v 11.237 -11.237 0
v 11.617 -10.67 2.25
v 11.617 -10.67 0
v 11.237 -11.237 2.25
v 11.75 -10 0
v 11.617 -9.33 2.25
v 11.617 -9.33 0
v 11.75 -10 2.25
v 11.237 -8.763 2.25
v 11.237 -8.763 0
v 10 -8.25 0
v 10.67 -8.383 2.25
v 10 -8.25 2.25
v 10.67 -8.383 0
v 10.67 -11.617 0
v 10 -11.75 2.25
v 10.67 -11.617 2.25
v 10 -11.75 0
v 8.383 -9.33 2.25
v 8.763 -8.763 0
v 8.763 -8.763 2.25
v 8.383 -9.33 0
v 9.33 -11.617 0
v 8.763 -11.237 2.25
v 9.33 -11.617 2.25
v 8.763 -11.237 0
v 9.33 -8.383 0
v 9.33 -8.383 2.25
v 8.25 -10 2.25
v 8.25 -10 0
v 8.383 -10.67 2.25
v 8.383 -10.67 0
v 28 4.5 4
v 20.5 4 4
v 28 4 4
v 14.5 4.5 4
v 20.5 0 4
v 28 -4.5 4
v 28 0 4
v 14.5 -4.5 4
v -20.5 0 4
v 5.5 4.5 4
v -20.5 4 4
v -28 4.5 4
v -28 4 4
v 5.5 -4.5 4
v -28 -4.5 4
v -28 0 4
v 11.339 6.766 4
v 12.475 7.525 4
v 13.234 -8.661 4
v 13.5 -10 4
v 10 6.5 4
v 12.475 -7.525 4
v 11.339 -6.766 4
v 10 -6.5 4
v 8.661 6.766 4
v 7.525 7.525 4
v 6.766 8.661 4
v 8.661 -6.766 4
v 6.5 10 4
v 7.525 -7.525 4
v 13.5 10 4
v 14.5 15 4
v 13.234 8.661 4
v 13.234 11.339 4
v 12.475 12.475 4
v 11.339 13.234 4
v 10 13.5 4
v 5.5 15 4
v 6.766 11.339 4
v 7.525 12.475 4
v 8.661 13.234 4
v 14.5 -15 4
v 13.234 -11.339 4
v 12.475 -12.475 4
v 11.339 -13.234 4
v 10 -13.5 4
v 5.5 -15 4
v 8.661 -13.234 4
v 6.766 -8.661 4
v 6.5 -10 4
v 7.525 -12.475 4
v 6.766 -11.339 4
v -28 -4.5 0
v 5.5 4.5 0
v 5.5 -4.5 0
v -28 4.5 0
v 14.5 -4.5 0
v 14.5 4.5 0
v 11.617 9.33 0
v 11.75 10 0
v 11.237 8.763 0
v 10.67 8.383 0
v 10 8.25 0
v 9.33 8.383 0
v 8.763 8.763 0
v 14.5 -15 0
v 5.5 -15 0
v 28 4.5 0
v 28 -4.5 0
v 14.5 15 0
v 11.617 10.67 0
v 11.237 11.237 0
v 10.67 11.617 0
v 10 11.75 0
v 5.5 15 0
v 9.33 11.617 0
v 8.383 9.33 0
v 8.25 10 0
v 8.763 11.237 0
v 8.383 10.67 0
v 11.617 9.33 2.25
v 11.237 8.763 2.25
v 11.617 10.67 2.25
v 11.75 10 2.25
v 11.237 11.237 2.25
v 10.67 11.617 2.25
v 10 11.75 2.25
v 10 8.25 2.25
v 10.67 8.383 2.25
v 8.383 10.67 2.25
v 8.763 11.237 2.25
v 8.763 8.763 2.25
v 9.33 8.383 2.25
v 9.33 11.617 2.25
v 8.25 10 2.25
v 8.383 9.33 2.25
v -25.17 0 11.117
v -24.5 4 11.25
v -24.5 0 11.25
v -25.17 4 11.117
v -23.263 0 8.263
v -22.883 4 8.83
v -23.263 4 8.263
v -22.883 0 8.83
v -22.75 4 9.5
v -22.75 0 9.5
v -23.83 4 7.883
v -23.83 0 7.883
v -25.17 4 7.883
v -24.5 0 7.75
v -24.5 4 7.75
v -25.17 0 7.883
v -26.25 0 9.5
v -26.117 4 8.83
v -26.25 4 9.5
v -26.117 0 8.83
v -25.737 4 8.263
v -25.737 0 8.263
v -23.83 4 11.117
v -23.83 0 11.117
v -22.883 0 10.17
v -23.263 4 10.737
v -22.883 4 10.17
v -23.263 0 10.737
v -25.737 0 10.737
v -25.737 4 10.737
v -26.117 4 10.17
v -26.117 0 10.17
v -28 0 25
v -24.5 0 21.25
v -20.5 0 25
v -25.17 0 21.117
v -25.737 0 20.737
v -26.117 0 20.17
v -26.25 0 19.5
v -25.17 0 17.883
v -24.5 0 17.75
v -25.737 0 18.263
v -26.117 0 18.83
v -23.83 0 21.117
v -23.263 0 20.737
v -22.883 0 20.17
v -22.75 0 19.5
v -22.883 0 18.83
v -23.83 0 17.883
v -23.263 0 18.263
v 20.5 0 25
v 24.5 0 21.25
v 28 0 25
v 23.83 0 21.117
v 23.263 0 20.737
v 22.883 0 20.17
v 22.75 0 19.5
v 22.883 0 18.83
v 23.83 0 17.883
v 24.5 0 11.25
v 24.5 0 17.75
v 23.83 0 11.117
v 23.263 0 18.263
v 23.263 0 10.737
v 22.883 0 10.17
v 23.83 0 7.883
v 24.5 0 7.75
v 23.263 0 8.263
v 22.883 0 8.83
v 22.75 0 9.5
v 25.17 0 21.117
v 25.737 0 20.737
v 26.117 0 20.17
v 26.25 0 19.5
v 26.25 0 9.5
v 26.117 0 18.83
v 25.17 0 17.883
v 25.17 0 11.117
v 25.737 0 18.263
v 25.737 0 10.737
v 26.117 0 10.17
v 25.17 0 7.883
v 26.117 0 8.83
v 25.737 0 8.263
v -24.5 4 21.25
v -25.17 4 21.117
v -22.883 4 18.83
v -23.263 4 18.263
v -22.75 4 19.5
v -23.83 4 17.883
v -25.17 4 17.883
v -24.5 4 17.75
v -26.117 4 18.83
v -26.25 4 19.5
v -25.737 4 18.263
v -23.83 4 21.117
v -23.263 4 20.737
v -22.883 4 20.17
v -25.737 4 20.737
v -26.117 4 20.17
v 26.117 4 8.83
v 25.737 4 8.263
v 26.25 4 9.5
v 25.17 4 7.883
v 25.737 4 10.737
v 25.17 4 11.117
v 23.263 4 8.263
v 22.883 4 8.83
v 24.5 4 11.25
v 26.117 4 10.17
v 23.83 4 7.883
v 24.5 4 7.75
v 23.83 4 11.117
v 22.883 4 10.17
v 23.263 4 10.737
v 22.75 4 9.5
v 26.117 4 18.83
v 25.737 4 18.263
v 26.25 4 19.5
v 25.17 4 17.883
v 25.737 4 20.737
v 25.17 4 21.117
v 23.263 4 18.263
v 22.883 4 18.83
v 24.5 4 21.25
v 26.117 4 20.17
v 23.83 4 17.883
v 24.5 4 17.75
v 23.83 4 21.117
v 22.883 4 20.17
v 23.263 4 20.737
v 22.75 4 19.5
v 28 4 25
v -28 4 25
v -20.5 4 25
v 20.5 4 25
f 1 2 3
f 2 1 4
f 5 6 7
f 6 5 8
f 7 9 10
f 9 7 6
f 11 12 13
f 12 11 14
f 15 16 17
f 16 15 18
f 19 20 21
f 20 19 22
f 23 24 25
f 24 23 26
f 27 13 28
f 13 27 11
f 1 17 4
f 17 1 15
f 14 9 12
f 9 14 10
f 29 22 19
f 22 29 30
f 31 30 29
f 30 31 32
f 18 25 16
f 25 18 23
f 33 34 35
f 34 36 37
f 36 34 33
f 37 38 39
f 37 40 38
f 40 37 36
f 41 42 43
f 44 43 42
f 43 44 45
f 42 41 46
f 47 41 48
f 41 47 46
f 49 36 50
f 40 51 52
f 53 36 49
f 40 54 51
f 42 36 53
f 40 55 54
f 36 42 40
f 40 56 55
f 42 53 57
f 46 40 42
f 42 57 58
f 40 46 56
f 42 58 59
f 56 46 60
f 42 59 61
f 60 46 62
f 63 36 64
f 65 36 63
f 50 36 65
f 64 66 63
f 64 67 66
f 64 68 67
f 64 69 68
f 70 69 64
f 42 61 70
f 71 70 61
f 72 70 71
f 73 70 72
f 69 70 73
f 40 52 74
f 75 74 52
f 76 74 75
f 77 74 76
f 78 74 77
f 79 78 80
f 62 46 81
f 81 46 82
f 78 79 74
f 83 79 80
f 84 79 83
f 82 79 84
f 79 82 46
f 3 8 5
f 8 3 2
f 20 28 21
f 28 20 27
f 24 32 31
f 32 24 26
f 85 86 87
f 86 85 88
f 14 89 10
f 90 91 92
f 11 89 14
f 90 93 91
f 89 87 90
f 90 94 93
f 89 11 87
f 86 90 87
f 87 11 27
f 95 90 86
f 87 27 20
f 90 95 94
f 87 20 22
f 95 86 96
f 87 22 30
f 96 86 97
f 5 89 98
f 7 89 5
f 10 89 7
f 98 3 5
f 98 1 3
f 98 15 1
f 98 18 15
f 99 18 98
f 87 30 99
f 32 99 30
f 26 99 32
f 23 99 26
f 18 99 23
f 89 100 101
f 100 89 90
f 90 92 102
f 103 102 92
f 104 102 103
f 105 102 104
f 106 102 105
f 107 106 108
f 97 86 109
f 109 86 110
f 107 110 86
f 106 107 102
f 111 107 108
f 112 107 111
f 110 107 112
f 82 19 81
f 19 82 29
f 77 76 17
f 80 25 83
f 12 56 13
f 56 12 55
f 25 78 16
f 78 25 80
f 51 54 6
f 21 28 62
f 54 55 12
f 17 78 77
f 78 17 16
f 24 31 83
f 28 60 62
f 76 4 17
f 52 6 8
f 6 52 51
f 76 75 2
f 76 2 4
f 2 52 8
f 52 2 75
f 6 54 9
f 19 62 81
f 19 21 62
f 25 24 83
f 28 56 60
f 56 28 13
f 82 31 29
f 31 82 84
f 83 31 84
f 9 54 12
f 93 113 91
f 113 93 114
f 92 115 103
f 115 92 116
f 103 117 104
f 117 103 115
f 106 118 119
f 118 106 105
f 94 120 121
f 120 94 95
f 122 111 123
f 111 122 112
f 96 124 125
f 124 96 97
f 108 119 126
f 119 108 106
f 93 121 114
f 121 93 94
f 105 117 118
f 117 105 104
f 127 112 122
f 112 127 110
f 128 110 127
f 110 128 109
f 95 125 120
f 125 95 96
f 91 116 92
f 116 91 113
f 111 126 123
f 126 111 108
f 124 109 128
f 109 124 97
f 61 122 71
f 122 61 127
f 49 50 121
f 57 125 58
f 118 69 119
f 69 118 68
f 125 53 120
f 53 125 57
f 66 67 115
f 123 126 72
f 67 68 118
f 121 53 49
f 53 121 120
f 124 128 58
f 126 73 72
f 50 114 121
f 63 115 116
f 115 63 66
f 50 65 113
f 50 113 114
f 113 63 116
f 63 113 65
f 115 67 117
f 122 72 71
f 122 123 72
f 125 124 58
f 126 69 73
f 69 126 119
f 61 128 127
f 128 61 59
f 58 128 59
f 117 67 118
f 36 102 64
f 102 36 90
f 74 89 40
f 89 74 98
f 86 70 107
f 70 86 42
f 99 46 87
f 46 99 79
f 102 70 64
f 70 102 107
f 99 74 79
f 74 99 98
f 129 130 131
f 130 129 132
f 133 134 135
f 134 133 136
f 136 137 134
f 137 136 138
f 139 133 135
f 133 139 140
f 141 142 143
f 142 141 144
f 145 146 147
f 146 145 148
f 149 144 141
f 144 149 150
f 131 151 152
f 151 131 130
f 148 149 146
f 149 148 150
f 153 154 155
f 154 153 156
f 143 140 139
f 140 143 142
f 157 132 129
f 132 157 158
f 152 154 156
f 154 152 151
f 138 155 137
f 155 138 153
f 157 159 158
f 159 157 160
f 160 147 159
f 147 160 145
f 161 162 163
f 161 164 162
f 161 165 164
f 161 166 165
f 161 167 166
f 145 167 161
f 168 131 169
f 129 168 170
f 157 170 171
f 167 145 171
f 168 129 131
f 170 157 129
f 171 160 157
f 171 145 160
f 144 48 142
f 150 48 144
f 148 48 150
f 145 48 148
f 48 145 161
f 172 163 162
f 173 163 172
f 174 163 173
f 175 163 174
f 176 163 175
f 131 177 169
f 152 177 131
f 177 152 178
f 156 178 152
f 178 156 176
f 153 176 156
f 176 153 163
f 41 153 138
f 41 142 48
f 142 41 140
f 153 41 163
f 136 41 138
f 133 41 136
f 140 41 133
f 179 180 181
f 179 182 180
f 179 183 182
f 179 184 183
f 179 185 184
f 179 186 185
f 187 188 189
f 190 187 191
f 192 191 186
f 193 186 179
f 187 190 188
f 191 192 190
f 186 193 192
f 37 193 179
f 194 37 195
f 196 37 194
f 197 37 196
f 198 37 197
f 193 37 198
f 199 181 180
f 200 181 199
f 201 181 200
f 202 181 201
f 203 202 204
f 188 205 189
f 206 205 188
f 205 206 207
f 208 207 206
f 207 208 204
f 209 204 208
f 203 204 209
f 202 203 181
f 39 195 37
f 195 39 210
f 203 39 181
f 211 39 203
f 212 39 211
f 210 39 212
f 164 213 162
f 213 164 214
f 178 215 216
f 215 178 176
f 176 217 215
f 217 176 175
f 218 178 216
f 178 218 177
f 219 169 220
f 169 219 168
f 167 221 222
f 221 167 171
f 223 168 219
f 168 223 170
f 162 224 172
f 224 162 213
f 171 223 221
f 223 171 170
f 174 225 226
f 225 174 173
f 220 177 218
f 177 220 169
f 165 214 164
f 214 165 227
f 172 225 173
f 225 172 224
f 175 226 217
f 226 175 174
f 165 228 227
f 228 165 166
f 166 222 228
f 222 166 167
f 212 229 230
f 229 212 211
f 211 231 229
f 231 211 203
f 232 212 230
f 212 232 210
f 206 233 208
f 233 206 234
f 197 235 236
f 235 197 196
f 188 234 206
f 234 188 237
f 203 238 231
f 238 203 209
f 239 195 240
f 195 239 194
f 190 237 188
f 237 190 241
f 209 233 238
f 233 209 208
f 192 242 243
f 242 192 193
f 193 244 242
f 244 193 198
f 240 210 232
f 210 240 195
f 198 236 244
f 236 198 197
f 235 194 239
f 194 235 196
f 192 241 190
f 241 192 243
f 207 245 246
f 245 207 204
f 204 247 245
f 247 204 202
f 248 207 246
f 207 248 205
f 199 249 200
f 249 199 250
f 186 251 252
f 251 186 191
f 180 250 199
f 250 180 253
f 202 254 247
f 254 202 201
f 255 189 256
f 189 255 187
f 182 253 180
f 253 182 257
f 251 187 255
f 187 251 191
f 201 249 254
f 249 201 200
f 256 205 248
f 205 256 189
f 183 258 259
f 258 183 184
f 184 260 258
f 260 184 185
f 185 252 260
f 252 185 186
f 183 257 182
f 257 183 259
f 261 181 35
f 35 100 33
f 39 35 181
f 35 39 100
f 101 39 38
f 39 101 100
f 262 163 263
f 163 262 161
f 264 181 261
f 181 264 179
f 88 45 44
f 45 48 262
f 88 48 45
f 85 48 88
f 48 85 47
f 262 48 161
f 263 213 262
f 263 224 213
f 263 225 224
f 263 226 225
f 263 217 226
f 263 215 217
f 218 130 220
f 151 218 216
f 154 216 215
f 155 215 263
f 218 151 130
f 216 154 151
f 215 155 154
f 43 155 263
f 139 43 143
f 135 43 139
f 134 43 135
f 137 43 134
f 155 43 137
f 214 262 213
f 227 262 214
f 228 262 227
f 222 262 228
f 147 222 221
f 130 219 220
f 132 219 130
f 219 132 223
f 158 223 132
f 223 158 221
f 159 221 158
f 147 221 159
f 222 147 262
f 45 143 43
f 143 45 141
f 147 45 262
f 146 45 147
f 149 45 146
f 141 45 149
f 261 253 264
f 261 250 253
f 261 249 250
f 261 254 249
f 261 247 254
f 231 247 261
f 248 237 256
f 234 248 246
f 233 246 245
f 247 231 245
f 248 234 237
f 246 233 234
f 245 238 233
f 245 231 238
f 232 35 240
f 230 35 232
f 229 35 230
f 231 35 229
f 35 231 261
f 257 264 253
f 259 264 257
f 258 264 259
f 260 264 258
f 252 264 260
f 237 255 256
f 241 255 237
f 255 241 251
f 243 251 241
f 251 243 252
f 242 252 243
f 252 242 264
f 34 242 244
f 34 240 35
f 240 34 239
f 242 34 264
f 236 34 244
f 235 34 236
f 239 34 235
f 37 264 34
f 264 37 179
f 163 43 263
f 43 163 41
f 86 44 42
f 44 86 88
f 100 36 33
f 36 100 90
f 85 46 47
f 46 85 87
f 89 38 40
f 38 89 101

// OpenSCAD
width = 9;
thickness = 4;
holeSep = 20;
holeDiam = 3.5;
length = 30;
servoLength = 56;
servoSize = 41;
servoWidth = 21;
servoHoleSep = 10;
servoHoleDist = 49;
baseXPos = servoLength/2 - 18;

$fn = 16;

// cube centered in x axis
module xcube(size) { translate([-size[0]/2, 0, 0]) cube(size); }

// cube centered in x and y axis
module xycube(size) { translate([-size[0]/2, -size[1]/2, 0]) cube(size); }

module countersunkHole(d, l) {
    union() {
        cylinder(l, d=d);
        translate([0, 0, l-d/2]) cylinder(d/2, d/2, d);
    }
}

module base() {
    difference() {
        xycube([width, length, thickness]);
        for (i = [-1, 1]) {
            translate([0, i*holeSep/2, 0]) countersunkHole(holeDiam, thickness);
        }
    }
}

module servoHolder() {
    th = thickness;
    w = servoWidth;

    union() {
        xycube([servoLength, width, th]);
        translate([0, 0, th]) {
            difference() {
                xcube([servoLength, th, w]);
                xcube([servoSize, th, w]);
                for (i = [-1, 1]) for (j = [-1, 1]) {
                    translate([i*servoHoleDist/2, 0, (w + j*servoHoleSep)/2])
                        rotate([-90, 0, 0]) cylinder(th+1, d=holeDiam);
                }
            }
        }
    }
}

union() {
    translate([baseXPos, 0, 0]) base();
    servoHolder();
}
